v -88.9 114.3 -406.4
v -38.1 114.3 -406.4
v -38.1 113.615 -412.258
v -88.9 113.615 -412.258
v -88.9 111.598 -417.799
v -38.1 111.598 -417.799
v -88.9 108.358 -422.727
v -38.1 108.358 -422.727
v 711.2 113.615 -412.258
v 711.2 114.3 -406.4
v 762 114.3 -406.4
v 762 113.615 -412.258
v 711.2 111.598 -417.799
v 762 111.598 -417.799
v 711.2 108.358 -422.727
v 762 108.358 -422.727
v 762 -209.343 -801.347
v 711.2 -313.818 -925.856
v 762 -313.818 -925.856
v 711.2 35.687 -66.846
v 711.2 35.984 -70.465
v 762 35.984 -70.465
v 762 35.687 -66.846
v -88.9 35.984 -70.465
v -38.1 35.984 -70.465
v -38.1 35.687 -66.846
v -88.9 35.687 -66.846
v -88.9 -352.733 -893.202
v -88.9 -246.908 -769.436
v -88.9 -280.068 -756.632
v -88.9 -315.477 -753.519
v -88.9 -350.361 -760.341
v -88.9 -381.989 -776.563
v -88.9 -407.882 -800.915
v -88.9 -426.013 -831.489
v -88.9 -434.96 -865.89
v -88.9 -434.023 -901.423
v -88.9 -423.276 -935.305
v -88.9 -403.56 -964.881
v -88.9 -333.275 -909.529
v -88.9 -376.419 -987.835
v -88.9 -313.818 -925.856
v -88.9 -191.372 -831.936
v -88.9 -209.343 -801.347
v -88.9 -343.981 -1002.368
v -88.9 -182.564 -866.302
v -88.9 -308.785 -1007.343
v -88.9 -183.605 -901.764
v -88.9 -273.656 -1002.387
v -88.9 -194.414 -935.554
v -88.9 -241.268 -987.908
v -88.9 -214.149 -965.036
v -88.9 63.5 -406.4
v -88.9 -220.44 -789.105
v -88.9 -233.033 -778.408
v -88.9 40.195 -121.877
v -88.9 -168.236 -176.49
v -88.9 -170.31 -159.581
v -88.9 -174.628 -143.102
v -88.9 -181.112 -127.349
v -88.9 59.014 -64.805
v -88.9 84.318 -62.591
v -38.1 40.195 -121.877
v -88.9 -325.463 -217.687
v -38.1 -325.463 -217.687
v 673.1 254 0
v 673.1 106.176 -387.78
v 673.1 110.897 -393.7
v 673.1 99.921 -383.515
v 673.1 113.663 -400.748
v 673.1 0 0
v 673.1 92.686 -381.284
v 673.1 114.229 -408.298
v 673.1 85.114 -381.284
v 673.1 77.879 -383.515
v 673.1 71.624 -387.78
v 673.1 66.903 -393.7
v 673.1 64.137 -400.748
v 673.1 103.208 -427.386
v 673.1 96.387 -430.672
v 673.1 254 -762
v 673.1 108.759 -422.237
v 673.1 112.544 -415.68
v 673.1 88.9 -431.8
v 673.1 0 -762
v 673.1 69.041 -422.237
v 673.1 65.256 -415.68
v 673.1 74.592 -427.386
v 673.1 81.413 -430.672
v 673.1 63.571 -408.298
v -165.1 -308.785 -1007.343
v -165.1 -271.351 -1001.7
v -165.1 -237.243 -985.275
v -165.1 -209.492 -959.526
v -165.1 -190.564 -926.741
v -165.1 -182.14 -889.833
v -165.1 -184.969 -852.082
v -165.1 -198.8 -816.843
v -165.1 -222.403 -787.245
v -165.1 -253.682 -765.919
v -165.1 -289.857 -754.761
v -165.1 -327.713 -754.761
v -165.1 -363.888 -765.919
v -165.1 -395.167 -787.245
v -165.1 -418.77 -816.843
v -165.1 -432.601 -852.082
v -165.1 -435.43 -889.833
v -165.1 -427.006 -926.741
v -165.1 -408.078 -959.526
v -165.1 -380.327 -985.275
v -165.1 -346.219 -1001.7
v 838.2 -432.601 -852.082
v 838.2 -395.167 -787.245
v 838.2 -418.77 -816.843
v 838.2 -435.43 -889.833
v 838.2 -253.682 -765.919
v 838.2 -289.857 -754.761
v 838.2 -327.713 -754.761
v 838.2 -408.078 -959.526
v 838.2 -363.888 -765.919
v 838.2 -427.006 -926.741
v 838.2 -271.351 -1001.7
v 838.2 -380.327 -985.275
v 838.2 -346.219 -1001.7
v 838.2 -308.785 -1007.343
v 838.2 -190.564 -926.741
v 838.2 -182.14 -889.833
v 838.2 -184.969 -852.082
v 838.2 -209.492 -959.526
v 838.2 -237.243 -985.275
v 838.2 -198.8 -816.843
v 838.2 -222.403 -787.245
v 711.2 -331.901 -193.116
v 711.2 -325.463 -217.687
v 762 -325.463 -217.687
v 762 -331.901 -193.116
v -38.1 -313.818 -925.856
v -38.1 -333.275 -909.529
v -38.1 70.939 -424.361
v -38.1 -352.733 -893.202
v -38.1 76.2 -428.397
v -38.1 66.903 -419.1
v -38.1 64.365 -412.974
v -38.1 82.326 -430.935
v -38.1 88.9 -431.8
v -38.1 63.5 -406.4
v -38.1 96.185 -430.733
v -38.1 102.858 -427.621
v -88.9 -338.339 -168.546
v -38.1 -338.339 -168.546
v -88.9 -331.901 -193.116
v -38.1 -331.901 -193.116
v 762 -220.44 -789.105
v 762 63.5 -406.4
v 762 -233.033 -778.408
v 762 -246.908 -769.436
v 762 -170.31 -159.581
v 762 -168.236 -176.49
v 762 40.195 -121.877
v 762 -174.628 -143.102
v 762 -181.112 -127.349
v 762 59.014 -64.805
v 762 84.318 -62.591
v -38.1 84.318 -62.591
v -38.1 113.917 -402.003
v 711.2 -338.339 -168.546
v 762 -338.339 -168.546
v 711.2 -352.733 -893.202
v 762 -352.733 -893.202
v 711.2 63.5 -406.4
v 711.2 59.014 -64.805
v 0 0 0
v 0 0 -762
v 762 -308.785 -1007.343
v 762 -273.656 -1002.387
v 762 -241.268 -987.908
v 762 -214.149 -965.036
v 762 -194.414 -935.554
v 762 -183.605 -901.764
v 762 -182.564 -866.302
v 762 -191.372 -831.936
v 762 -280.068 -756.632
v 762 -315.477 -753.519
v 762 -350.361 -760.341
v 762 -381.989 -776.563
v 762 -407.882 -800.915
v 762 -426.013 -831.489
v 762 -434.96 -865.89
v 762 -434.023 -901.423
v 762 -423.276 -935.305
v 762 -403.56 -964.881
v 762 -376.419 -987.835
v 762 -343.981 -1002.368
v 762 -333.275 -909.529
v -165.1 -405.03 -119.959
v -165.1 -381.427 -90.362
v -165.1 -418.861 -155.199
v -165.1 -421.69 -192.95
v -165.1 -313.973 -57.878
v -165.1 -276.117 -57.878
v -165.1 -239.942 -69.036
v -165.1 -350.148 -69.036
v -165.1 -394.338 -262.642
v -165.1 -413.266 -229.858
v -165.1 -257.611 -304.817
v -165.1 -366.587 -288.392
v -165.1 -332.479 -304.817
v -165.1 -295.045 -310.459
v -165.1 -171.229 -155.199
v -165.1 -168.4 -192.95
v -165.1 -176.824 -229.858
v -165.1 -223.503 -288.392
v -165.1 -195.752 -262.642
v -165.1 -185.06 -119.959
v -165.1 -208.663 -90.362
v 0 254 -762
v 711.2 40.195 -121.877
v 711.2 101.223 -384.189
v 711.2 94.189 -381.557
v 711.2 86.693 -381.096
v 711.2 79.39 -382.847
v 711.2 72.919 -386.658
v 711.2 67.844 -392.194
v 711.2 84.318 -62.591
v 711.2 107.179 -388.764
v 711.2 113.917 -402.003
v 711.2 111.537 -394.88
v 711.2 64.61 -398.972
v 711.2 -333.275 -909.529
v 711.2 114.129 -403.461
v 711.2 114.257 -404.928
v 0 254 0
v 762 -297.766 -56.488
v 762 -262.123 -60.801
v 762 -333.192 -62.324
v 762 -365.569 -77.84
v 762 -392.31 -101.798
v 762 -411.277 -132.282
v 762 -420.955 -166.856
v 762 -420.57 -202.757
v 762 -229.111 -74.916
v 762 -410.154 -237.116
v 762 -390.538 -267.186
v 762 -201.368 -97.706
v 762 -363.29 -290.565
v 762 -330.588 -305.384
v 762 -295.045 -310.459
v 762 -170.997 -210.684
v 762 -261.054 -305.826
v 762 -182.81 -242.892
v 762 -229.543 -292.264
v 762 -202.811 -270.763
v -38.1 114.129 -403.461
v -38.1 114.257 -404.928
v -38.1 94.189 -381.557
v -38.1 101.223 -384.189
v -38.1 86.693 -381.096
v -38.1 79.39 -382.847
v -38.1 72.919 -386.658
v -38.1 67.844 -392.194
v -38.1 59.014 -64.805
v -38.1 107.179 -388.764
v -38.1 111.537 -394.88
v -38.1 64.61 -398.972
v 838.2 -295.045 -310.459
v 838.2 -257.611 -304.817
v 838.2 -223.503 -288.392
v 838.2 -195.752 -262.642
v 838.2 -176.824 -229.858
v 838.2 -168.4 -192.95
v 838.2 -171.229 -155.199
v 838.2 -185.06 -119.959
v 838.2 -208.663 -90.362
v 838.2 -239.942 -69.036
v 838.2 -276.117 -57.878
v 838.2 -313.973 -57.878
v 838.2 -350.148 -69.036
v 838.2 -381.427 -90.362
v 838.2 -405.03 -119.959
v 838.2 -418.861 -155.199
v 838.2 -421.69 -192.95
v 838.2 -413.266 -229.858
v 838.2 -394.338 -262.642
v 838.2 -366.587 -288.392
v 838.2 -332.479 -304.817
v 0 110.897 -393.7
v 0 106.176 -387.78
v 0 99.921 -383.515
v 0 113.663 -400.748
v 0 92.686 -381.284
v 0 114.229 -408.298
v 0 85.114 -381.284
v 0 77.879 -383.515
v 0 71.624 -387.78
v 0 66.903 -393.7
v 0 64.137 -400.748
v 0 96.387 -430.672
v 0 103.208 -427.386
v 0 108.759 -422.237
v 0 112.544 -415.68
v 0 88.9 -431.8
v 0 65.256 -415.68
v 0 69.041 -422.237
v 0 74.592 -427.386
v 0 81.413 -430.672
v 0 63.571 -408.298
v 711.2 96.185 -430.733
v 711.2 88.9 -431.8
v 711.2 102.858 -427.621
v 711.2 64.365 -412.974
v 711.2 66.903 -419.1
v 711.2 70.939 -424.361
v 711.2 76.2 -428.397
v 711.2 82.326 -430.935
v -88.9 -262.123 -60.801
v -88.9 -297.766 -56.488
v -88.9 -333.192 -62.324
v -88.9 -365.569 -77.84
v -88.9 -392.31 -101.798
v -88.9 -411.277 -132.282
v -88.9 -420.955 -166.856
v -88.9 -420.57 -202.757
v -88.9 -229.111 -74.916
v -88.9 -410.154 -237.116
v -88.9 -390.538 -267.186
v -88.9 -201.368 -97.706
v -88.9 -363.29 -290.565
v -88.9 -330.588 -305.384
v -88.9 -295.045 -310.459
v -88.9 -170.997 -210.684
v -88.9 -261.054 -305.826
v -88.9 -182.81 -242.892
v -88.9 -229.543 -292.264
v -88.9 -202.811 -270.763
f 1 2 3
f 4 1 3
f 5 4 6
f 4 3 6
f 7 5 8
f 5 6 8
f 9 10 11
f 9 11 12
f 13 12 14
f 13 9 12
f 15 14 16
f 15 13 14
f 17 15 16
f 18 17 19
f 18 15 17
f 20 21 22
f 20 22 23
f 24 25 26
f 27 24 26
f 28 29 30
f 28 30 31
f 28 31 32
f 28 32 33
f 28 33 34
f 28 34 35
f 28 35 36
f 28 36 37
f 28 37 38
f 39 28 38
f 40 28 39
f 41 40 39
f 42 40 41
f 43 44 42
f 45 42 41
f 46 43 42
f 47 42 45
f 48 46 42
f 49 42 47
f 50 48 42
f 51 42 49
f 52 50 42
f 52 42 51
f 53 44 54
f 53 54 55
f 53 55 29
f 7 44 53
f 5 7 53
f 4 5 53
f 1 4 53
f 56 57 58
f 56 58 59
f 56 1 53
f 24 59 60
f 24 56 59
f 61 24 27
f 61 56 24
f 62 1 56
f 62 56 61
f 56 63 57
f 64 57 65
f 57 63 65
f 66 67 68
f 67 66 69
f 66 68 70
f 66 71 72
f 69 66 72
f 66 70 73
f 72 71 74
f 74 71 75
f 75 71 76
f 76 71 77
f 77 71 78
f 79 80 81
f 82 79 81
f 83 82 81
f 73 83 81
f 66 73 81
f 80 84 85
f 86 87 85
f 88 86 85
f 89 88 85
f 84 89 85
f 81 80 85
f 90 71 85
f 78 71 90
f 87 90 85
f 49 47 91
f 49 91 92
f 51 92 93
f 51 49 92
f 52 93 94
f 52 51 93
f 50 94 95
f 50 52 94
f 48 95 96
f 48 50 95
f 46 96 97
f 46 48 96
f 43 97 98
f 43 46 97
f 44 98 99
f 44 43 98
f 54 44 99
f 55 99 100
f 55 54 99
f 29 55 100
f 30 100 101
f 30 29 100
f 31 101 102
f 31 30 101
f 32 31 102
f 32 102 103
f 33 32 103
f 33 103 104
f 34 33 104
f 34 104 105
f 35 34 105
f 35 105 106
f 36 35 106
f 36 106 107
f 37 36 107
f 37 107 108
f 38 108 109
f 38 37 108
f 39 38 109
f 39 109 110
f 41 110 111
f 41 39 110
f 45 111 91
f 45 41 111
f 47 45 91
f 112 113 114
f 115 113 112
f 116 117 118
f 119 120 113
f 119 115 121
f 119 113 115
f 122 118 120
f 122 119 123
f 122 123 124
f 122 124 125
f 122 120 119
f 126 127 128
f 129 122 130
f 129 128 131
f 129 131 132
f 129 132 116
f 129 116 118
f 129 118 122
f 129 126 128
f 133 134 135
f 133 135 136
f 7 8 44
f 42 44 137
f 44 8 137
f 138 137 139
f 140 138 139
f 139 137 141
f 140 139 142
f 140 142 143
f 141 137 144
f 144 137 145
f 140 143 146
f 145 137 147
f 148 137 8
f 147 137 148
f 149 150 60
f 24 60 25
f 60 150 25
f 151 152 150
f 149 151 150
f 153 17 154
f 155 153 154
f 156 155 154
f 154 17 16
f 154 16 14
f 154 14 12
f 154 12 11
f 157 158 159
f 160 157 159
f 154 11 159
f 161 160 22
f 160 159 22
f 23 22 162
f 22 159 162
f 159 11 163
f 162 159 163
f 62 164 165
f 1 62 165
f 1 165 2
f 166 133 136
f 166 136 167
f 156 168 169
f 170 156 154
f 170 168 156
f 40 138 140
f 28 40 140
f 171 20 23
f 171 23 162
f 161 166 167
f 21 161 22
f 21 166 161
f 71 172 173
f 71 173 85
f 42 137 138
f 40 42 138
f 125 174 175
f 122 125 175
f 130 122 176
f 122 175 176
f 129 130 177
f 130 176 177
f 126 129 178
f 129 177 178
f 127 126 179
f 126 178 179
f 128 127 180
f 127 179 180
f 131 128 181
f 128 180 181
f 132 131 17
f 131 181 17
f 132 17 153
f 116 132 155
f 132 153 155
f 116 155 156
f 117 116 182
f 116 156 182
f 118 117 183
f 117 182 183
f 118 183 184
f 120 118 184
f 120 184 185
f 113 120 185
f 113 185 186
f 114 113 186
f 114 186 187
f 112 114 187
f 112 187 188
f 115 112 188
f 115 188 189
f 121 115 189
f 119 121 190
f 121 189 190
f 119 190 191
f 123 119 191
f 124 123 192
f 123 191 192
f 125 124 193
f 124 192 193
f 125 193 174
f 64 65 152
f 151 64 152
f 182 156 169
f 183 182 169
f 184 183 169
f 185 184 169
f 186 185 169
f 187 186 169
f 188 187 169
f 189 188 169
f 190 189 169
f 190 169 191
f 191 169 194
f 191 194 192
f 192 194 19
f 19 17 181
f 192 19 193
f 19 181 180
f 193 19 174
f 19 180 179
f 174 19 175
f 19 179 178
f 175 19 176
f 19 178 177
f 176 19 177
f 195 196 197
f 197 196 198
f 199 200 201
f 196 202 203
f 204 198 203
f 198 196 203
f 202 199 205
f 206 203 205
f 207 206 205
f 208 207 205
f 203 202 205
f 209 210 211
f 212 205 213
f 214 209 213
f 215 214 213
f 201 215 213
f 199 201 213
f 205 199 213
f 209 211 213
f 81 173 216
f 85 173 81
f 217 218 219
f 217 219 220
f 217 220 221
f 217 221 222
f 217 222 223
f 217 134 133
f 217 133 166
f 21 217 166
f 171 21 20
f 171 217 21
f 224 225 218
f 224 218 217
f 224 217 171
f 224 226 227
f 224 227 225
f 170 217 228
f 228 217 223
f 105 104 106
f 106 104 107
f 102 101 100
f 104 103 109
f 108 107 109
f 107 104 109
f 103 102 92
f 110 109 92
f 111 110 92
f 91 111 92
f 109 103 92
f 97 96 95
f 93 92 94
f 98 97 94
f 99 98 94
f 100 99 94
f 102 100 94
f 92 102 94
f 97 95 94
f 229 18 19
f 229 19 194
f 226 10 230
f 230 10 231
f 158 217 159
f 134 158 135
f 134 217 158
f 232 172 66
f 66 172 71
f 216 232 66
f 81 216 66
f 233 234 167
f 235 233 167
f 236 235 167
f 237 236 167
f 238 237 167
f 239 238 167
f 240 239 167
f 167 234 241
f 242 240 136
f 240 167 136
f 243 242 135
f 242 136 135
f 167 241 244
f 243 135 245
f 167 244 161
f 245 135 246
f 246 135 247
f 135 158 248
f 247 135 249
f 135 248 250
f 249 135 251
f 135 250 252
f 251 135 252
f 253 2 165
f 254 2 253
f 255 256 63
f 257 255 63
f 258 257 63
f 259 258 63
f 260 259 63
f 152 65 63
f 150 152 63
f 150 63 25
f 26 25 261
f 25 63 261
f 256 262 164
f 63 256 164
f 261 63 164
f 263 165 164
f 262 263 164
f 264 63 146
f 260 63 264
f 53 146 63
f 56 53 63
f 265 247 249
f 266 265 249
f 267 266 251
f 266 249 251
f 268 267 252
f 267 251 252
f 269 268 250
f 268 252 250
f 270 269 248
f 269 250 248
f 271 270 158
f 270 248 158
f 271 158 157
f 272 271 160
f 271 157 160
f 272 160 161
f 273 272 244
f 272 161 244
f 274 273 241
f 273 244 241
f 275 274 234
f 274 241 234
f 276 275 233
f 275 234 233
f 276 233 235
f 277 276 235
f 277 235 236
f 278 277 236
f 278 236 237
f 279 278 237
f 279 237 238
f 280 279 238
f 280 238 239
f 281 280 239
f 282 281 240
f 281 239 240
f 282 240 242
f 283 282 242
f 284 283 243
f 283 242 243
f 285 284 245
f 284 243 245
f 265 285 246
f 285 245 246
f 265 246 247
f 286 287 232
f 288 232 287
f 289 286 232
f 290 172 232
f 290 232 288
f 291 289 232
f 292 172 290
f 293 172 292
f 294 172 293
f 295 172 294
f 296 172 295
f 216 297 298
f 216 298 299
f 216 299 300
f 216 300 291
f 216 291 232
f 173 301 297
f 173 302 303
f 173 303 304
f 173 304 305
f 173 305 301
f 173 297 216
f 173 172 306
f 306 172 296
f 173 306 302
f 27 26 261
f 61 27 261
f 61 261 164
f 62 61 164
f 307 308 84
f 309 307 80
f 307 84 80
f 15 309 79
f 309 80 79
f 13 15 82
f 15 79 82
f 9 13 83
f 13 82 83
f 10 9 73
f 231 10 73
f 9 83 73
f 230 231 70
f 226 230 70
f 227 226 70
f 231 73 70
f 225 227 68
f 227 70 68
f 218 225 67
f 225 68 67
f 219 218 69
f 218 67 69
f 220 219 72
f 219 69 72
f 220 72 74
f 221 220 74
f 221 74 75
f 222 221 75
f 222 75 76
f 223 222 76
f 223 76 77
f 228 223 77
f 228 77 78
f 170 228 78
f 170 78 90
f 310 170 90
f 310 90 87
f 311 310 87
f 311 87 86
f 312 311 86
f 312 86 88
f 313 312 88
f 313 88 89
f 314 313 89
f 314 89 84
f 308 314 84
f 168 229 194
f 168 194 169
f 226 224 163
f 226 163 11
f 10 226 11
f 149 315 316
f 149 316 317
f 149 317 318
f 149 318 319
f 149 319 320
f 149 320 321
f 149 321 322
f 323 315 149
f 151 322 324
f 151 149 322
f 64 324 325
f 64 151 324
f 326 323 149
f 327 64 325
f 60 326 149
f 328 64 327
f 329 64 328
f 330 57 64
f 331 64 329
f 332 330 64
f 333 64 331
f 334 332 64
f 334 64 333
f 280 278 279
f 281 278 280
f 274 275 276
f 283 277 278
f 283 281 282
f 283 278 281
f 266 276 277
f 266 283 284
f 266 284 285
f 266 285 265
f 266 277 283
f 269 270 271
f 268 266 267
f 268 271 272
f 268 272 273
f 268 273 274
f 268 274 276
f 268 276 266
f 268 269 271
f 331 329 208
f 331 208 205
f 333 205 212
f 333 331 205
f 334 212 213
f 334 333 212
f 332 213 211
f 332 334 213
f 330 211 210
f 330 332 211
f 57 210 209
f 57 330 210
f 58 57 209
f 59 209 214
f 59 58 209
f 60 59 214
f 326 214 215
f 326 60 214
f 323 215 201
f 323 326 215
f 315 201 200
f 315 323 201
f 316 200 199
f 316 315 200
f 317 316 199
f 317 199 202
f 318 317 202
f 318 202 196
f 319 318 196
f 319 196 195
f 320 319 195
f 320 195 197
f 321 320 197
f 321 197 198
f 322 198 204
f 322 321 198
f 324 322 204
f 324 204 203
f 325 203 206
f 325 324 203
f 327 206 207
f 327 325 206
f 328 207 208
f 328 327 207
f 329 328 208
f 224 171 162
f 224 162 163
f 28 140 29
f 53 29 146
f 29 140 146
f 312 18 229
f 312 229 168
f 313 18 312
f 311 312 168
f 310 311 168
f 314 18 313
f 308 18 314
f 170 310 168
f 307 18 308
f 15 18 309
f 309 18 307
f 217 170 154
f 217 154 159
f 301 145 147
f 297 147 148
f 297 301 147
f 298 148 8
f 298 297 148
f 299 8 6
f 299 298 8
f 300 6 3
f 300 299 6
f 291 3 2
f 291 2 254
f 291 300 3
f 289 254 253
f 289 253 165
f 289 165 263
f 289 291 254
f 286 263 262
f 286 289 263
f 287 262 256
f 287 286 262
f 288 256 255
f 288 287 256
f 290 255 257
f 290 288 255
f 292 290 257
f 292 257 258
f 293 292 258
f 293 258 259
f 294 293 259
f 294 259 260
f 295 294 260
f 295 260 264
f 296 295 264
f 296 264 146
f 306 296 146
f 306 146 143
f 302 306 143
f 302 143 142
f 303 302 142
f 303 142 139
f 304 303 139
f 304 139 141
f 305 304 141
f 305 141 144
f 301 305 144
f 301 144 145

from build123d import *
from build123d.topology import SkipClean

# Parameters (mm, degrees)
SKETCH1_W           = 673.1
SKETCH1_H           = 762
BOSS_EXTRUDE1_DEPTH = 254
SKETCH2_R           = 25.4
BOSS_EXTRUDE2_DEPTH = 38.1
BOSS_EXTRUDE3_DEPTH = 50.8
SKETCH4_R           = 127
BOSS_EXTRUDE4_DEPTH = 76.2


with BuildPart() as part:
    # Sketch1 → Boss-Extrude1 (new body)
    with BuildSketch(Plane(origin=(0, 0, 0), x_dir=(1, 0, 0), z_dir=(0, 1, 0))):
        with Locations((336.55, 381)):
            Rectangle(SKETCH1_W, SKETCH1_H)
    extrude(amount=BOSS_EXTRUDE1_DEPTH)

    # Sketch2 → Boss-Extrude2 (add)
    with BuildSketch(Plane(origin=(673.1, 0, 0), x_dir=(0, 0, -1), z_dir=(1, 0, 0))):
        with Locations((406.4, 88.9)):
            Circle(SKETCH2_R)
    boss_extrude2 = extrude(amount=BOSS_EXTRUDE2_DEPTH)

    # Sketch3 → Boss-Extrude3 (add)
    with SkipClean():  # the faces are left unmerged after this step: merging them gives an invalid solid
        with BuildSketch(Plane(origin=(711.2, 0, 0), x_dir=(0, 0, -1), z_dir=(1, 0, 0))):
            with BuildLine():
                Line((422.726805286, 108.357528855), (925.855623983, -313.817677348))
                Line((925.855623983, -313.817677348), (909.528818697, -333.275206203))
                Line((909.528818697, -333.275206203), (893.202013411, -352.732735059))
                Line((893.202013411, -352.732735059), (406.4, 63.5))
                Line((406.4, 63.5), (121.876807164, 40.194732275))
                Line((121.876807164, 40.194732275), (217.686843741, -325.462787901))
                Line((217.686843741, -325.462787901), (193.116290848, -331.90079462))
                Line((193.116290848, -331.90079462), (168.545737954, -338.338801338))
                Line((168.545737954, -338.338801338), (70.465312804, 35.98362165))
                Line((70.465312804, 35.98362165), (66.845699755, 35.687139489))
                Line((66.845699755, 35.687139489), (64.804838024, 59.014295812))
                Line((64.804838024, 59.014295812), (62.591082159, 84.317641143))
                Line((62.591082159, 84.317641143), (406.4, 114.3))
                ThreePointArc((406.4, 114.3), (415.08731164, 112.768192568), (422.726805286, 108.357528855))
            make_face()
        boss_extrude3 = extrude(amount=BOSS_EXTRUDE3_DEPTH)

    # Sketch4 → Boss-Extrude4 (add)
    with SkipClean():  # the faces are left unmerged after this step: merging them gives an invalid solid
        with BuildSketch(Plane(origin=(762, 0, 0), x_dir=(0, 0, -1), z_dir=(1, 0, 0))):
            with Locations((183.45928077, -295.044965279)):
                Circle(SKETCH4_R)
            with Locations((880.342525414, -308.784998274)):
                Circle(SKETCH4_R)
        boss_extrude4 = extrude(amount=BOSS_EXTRUDE4_DEPTH)

    # Mirror1: Boss-Extrude2, Boss-Extrude3, Boss-Extrude4 across plane
    with SkipClean():  # the faces are left unmerged after this step: merging them gives an invalid solid
        add(boss_extrude2.mirror(Plane(origin=(336.55, 0, 0), x_dir=(0, 0, 1), z_dir=(1, 0, 0))))
        add(boss_extrude3.mirror(Plane(origin=(336.55, 0, 0), x_dir=(0, 0, 1), z_dir=(1, 0, 0))))
        add(boss_extrude4.mirror(Plane(origin=(336.55, 0, 0), x_dir=(0, 0, 1), z_dir=(1, 0, 0))))


solid = part.part
